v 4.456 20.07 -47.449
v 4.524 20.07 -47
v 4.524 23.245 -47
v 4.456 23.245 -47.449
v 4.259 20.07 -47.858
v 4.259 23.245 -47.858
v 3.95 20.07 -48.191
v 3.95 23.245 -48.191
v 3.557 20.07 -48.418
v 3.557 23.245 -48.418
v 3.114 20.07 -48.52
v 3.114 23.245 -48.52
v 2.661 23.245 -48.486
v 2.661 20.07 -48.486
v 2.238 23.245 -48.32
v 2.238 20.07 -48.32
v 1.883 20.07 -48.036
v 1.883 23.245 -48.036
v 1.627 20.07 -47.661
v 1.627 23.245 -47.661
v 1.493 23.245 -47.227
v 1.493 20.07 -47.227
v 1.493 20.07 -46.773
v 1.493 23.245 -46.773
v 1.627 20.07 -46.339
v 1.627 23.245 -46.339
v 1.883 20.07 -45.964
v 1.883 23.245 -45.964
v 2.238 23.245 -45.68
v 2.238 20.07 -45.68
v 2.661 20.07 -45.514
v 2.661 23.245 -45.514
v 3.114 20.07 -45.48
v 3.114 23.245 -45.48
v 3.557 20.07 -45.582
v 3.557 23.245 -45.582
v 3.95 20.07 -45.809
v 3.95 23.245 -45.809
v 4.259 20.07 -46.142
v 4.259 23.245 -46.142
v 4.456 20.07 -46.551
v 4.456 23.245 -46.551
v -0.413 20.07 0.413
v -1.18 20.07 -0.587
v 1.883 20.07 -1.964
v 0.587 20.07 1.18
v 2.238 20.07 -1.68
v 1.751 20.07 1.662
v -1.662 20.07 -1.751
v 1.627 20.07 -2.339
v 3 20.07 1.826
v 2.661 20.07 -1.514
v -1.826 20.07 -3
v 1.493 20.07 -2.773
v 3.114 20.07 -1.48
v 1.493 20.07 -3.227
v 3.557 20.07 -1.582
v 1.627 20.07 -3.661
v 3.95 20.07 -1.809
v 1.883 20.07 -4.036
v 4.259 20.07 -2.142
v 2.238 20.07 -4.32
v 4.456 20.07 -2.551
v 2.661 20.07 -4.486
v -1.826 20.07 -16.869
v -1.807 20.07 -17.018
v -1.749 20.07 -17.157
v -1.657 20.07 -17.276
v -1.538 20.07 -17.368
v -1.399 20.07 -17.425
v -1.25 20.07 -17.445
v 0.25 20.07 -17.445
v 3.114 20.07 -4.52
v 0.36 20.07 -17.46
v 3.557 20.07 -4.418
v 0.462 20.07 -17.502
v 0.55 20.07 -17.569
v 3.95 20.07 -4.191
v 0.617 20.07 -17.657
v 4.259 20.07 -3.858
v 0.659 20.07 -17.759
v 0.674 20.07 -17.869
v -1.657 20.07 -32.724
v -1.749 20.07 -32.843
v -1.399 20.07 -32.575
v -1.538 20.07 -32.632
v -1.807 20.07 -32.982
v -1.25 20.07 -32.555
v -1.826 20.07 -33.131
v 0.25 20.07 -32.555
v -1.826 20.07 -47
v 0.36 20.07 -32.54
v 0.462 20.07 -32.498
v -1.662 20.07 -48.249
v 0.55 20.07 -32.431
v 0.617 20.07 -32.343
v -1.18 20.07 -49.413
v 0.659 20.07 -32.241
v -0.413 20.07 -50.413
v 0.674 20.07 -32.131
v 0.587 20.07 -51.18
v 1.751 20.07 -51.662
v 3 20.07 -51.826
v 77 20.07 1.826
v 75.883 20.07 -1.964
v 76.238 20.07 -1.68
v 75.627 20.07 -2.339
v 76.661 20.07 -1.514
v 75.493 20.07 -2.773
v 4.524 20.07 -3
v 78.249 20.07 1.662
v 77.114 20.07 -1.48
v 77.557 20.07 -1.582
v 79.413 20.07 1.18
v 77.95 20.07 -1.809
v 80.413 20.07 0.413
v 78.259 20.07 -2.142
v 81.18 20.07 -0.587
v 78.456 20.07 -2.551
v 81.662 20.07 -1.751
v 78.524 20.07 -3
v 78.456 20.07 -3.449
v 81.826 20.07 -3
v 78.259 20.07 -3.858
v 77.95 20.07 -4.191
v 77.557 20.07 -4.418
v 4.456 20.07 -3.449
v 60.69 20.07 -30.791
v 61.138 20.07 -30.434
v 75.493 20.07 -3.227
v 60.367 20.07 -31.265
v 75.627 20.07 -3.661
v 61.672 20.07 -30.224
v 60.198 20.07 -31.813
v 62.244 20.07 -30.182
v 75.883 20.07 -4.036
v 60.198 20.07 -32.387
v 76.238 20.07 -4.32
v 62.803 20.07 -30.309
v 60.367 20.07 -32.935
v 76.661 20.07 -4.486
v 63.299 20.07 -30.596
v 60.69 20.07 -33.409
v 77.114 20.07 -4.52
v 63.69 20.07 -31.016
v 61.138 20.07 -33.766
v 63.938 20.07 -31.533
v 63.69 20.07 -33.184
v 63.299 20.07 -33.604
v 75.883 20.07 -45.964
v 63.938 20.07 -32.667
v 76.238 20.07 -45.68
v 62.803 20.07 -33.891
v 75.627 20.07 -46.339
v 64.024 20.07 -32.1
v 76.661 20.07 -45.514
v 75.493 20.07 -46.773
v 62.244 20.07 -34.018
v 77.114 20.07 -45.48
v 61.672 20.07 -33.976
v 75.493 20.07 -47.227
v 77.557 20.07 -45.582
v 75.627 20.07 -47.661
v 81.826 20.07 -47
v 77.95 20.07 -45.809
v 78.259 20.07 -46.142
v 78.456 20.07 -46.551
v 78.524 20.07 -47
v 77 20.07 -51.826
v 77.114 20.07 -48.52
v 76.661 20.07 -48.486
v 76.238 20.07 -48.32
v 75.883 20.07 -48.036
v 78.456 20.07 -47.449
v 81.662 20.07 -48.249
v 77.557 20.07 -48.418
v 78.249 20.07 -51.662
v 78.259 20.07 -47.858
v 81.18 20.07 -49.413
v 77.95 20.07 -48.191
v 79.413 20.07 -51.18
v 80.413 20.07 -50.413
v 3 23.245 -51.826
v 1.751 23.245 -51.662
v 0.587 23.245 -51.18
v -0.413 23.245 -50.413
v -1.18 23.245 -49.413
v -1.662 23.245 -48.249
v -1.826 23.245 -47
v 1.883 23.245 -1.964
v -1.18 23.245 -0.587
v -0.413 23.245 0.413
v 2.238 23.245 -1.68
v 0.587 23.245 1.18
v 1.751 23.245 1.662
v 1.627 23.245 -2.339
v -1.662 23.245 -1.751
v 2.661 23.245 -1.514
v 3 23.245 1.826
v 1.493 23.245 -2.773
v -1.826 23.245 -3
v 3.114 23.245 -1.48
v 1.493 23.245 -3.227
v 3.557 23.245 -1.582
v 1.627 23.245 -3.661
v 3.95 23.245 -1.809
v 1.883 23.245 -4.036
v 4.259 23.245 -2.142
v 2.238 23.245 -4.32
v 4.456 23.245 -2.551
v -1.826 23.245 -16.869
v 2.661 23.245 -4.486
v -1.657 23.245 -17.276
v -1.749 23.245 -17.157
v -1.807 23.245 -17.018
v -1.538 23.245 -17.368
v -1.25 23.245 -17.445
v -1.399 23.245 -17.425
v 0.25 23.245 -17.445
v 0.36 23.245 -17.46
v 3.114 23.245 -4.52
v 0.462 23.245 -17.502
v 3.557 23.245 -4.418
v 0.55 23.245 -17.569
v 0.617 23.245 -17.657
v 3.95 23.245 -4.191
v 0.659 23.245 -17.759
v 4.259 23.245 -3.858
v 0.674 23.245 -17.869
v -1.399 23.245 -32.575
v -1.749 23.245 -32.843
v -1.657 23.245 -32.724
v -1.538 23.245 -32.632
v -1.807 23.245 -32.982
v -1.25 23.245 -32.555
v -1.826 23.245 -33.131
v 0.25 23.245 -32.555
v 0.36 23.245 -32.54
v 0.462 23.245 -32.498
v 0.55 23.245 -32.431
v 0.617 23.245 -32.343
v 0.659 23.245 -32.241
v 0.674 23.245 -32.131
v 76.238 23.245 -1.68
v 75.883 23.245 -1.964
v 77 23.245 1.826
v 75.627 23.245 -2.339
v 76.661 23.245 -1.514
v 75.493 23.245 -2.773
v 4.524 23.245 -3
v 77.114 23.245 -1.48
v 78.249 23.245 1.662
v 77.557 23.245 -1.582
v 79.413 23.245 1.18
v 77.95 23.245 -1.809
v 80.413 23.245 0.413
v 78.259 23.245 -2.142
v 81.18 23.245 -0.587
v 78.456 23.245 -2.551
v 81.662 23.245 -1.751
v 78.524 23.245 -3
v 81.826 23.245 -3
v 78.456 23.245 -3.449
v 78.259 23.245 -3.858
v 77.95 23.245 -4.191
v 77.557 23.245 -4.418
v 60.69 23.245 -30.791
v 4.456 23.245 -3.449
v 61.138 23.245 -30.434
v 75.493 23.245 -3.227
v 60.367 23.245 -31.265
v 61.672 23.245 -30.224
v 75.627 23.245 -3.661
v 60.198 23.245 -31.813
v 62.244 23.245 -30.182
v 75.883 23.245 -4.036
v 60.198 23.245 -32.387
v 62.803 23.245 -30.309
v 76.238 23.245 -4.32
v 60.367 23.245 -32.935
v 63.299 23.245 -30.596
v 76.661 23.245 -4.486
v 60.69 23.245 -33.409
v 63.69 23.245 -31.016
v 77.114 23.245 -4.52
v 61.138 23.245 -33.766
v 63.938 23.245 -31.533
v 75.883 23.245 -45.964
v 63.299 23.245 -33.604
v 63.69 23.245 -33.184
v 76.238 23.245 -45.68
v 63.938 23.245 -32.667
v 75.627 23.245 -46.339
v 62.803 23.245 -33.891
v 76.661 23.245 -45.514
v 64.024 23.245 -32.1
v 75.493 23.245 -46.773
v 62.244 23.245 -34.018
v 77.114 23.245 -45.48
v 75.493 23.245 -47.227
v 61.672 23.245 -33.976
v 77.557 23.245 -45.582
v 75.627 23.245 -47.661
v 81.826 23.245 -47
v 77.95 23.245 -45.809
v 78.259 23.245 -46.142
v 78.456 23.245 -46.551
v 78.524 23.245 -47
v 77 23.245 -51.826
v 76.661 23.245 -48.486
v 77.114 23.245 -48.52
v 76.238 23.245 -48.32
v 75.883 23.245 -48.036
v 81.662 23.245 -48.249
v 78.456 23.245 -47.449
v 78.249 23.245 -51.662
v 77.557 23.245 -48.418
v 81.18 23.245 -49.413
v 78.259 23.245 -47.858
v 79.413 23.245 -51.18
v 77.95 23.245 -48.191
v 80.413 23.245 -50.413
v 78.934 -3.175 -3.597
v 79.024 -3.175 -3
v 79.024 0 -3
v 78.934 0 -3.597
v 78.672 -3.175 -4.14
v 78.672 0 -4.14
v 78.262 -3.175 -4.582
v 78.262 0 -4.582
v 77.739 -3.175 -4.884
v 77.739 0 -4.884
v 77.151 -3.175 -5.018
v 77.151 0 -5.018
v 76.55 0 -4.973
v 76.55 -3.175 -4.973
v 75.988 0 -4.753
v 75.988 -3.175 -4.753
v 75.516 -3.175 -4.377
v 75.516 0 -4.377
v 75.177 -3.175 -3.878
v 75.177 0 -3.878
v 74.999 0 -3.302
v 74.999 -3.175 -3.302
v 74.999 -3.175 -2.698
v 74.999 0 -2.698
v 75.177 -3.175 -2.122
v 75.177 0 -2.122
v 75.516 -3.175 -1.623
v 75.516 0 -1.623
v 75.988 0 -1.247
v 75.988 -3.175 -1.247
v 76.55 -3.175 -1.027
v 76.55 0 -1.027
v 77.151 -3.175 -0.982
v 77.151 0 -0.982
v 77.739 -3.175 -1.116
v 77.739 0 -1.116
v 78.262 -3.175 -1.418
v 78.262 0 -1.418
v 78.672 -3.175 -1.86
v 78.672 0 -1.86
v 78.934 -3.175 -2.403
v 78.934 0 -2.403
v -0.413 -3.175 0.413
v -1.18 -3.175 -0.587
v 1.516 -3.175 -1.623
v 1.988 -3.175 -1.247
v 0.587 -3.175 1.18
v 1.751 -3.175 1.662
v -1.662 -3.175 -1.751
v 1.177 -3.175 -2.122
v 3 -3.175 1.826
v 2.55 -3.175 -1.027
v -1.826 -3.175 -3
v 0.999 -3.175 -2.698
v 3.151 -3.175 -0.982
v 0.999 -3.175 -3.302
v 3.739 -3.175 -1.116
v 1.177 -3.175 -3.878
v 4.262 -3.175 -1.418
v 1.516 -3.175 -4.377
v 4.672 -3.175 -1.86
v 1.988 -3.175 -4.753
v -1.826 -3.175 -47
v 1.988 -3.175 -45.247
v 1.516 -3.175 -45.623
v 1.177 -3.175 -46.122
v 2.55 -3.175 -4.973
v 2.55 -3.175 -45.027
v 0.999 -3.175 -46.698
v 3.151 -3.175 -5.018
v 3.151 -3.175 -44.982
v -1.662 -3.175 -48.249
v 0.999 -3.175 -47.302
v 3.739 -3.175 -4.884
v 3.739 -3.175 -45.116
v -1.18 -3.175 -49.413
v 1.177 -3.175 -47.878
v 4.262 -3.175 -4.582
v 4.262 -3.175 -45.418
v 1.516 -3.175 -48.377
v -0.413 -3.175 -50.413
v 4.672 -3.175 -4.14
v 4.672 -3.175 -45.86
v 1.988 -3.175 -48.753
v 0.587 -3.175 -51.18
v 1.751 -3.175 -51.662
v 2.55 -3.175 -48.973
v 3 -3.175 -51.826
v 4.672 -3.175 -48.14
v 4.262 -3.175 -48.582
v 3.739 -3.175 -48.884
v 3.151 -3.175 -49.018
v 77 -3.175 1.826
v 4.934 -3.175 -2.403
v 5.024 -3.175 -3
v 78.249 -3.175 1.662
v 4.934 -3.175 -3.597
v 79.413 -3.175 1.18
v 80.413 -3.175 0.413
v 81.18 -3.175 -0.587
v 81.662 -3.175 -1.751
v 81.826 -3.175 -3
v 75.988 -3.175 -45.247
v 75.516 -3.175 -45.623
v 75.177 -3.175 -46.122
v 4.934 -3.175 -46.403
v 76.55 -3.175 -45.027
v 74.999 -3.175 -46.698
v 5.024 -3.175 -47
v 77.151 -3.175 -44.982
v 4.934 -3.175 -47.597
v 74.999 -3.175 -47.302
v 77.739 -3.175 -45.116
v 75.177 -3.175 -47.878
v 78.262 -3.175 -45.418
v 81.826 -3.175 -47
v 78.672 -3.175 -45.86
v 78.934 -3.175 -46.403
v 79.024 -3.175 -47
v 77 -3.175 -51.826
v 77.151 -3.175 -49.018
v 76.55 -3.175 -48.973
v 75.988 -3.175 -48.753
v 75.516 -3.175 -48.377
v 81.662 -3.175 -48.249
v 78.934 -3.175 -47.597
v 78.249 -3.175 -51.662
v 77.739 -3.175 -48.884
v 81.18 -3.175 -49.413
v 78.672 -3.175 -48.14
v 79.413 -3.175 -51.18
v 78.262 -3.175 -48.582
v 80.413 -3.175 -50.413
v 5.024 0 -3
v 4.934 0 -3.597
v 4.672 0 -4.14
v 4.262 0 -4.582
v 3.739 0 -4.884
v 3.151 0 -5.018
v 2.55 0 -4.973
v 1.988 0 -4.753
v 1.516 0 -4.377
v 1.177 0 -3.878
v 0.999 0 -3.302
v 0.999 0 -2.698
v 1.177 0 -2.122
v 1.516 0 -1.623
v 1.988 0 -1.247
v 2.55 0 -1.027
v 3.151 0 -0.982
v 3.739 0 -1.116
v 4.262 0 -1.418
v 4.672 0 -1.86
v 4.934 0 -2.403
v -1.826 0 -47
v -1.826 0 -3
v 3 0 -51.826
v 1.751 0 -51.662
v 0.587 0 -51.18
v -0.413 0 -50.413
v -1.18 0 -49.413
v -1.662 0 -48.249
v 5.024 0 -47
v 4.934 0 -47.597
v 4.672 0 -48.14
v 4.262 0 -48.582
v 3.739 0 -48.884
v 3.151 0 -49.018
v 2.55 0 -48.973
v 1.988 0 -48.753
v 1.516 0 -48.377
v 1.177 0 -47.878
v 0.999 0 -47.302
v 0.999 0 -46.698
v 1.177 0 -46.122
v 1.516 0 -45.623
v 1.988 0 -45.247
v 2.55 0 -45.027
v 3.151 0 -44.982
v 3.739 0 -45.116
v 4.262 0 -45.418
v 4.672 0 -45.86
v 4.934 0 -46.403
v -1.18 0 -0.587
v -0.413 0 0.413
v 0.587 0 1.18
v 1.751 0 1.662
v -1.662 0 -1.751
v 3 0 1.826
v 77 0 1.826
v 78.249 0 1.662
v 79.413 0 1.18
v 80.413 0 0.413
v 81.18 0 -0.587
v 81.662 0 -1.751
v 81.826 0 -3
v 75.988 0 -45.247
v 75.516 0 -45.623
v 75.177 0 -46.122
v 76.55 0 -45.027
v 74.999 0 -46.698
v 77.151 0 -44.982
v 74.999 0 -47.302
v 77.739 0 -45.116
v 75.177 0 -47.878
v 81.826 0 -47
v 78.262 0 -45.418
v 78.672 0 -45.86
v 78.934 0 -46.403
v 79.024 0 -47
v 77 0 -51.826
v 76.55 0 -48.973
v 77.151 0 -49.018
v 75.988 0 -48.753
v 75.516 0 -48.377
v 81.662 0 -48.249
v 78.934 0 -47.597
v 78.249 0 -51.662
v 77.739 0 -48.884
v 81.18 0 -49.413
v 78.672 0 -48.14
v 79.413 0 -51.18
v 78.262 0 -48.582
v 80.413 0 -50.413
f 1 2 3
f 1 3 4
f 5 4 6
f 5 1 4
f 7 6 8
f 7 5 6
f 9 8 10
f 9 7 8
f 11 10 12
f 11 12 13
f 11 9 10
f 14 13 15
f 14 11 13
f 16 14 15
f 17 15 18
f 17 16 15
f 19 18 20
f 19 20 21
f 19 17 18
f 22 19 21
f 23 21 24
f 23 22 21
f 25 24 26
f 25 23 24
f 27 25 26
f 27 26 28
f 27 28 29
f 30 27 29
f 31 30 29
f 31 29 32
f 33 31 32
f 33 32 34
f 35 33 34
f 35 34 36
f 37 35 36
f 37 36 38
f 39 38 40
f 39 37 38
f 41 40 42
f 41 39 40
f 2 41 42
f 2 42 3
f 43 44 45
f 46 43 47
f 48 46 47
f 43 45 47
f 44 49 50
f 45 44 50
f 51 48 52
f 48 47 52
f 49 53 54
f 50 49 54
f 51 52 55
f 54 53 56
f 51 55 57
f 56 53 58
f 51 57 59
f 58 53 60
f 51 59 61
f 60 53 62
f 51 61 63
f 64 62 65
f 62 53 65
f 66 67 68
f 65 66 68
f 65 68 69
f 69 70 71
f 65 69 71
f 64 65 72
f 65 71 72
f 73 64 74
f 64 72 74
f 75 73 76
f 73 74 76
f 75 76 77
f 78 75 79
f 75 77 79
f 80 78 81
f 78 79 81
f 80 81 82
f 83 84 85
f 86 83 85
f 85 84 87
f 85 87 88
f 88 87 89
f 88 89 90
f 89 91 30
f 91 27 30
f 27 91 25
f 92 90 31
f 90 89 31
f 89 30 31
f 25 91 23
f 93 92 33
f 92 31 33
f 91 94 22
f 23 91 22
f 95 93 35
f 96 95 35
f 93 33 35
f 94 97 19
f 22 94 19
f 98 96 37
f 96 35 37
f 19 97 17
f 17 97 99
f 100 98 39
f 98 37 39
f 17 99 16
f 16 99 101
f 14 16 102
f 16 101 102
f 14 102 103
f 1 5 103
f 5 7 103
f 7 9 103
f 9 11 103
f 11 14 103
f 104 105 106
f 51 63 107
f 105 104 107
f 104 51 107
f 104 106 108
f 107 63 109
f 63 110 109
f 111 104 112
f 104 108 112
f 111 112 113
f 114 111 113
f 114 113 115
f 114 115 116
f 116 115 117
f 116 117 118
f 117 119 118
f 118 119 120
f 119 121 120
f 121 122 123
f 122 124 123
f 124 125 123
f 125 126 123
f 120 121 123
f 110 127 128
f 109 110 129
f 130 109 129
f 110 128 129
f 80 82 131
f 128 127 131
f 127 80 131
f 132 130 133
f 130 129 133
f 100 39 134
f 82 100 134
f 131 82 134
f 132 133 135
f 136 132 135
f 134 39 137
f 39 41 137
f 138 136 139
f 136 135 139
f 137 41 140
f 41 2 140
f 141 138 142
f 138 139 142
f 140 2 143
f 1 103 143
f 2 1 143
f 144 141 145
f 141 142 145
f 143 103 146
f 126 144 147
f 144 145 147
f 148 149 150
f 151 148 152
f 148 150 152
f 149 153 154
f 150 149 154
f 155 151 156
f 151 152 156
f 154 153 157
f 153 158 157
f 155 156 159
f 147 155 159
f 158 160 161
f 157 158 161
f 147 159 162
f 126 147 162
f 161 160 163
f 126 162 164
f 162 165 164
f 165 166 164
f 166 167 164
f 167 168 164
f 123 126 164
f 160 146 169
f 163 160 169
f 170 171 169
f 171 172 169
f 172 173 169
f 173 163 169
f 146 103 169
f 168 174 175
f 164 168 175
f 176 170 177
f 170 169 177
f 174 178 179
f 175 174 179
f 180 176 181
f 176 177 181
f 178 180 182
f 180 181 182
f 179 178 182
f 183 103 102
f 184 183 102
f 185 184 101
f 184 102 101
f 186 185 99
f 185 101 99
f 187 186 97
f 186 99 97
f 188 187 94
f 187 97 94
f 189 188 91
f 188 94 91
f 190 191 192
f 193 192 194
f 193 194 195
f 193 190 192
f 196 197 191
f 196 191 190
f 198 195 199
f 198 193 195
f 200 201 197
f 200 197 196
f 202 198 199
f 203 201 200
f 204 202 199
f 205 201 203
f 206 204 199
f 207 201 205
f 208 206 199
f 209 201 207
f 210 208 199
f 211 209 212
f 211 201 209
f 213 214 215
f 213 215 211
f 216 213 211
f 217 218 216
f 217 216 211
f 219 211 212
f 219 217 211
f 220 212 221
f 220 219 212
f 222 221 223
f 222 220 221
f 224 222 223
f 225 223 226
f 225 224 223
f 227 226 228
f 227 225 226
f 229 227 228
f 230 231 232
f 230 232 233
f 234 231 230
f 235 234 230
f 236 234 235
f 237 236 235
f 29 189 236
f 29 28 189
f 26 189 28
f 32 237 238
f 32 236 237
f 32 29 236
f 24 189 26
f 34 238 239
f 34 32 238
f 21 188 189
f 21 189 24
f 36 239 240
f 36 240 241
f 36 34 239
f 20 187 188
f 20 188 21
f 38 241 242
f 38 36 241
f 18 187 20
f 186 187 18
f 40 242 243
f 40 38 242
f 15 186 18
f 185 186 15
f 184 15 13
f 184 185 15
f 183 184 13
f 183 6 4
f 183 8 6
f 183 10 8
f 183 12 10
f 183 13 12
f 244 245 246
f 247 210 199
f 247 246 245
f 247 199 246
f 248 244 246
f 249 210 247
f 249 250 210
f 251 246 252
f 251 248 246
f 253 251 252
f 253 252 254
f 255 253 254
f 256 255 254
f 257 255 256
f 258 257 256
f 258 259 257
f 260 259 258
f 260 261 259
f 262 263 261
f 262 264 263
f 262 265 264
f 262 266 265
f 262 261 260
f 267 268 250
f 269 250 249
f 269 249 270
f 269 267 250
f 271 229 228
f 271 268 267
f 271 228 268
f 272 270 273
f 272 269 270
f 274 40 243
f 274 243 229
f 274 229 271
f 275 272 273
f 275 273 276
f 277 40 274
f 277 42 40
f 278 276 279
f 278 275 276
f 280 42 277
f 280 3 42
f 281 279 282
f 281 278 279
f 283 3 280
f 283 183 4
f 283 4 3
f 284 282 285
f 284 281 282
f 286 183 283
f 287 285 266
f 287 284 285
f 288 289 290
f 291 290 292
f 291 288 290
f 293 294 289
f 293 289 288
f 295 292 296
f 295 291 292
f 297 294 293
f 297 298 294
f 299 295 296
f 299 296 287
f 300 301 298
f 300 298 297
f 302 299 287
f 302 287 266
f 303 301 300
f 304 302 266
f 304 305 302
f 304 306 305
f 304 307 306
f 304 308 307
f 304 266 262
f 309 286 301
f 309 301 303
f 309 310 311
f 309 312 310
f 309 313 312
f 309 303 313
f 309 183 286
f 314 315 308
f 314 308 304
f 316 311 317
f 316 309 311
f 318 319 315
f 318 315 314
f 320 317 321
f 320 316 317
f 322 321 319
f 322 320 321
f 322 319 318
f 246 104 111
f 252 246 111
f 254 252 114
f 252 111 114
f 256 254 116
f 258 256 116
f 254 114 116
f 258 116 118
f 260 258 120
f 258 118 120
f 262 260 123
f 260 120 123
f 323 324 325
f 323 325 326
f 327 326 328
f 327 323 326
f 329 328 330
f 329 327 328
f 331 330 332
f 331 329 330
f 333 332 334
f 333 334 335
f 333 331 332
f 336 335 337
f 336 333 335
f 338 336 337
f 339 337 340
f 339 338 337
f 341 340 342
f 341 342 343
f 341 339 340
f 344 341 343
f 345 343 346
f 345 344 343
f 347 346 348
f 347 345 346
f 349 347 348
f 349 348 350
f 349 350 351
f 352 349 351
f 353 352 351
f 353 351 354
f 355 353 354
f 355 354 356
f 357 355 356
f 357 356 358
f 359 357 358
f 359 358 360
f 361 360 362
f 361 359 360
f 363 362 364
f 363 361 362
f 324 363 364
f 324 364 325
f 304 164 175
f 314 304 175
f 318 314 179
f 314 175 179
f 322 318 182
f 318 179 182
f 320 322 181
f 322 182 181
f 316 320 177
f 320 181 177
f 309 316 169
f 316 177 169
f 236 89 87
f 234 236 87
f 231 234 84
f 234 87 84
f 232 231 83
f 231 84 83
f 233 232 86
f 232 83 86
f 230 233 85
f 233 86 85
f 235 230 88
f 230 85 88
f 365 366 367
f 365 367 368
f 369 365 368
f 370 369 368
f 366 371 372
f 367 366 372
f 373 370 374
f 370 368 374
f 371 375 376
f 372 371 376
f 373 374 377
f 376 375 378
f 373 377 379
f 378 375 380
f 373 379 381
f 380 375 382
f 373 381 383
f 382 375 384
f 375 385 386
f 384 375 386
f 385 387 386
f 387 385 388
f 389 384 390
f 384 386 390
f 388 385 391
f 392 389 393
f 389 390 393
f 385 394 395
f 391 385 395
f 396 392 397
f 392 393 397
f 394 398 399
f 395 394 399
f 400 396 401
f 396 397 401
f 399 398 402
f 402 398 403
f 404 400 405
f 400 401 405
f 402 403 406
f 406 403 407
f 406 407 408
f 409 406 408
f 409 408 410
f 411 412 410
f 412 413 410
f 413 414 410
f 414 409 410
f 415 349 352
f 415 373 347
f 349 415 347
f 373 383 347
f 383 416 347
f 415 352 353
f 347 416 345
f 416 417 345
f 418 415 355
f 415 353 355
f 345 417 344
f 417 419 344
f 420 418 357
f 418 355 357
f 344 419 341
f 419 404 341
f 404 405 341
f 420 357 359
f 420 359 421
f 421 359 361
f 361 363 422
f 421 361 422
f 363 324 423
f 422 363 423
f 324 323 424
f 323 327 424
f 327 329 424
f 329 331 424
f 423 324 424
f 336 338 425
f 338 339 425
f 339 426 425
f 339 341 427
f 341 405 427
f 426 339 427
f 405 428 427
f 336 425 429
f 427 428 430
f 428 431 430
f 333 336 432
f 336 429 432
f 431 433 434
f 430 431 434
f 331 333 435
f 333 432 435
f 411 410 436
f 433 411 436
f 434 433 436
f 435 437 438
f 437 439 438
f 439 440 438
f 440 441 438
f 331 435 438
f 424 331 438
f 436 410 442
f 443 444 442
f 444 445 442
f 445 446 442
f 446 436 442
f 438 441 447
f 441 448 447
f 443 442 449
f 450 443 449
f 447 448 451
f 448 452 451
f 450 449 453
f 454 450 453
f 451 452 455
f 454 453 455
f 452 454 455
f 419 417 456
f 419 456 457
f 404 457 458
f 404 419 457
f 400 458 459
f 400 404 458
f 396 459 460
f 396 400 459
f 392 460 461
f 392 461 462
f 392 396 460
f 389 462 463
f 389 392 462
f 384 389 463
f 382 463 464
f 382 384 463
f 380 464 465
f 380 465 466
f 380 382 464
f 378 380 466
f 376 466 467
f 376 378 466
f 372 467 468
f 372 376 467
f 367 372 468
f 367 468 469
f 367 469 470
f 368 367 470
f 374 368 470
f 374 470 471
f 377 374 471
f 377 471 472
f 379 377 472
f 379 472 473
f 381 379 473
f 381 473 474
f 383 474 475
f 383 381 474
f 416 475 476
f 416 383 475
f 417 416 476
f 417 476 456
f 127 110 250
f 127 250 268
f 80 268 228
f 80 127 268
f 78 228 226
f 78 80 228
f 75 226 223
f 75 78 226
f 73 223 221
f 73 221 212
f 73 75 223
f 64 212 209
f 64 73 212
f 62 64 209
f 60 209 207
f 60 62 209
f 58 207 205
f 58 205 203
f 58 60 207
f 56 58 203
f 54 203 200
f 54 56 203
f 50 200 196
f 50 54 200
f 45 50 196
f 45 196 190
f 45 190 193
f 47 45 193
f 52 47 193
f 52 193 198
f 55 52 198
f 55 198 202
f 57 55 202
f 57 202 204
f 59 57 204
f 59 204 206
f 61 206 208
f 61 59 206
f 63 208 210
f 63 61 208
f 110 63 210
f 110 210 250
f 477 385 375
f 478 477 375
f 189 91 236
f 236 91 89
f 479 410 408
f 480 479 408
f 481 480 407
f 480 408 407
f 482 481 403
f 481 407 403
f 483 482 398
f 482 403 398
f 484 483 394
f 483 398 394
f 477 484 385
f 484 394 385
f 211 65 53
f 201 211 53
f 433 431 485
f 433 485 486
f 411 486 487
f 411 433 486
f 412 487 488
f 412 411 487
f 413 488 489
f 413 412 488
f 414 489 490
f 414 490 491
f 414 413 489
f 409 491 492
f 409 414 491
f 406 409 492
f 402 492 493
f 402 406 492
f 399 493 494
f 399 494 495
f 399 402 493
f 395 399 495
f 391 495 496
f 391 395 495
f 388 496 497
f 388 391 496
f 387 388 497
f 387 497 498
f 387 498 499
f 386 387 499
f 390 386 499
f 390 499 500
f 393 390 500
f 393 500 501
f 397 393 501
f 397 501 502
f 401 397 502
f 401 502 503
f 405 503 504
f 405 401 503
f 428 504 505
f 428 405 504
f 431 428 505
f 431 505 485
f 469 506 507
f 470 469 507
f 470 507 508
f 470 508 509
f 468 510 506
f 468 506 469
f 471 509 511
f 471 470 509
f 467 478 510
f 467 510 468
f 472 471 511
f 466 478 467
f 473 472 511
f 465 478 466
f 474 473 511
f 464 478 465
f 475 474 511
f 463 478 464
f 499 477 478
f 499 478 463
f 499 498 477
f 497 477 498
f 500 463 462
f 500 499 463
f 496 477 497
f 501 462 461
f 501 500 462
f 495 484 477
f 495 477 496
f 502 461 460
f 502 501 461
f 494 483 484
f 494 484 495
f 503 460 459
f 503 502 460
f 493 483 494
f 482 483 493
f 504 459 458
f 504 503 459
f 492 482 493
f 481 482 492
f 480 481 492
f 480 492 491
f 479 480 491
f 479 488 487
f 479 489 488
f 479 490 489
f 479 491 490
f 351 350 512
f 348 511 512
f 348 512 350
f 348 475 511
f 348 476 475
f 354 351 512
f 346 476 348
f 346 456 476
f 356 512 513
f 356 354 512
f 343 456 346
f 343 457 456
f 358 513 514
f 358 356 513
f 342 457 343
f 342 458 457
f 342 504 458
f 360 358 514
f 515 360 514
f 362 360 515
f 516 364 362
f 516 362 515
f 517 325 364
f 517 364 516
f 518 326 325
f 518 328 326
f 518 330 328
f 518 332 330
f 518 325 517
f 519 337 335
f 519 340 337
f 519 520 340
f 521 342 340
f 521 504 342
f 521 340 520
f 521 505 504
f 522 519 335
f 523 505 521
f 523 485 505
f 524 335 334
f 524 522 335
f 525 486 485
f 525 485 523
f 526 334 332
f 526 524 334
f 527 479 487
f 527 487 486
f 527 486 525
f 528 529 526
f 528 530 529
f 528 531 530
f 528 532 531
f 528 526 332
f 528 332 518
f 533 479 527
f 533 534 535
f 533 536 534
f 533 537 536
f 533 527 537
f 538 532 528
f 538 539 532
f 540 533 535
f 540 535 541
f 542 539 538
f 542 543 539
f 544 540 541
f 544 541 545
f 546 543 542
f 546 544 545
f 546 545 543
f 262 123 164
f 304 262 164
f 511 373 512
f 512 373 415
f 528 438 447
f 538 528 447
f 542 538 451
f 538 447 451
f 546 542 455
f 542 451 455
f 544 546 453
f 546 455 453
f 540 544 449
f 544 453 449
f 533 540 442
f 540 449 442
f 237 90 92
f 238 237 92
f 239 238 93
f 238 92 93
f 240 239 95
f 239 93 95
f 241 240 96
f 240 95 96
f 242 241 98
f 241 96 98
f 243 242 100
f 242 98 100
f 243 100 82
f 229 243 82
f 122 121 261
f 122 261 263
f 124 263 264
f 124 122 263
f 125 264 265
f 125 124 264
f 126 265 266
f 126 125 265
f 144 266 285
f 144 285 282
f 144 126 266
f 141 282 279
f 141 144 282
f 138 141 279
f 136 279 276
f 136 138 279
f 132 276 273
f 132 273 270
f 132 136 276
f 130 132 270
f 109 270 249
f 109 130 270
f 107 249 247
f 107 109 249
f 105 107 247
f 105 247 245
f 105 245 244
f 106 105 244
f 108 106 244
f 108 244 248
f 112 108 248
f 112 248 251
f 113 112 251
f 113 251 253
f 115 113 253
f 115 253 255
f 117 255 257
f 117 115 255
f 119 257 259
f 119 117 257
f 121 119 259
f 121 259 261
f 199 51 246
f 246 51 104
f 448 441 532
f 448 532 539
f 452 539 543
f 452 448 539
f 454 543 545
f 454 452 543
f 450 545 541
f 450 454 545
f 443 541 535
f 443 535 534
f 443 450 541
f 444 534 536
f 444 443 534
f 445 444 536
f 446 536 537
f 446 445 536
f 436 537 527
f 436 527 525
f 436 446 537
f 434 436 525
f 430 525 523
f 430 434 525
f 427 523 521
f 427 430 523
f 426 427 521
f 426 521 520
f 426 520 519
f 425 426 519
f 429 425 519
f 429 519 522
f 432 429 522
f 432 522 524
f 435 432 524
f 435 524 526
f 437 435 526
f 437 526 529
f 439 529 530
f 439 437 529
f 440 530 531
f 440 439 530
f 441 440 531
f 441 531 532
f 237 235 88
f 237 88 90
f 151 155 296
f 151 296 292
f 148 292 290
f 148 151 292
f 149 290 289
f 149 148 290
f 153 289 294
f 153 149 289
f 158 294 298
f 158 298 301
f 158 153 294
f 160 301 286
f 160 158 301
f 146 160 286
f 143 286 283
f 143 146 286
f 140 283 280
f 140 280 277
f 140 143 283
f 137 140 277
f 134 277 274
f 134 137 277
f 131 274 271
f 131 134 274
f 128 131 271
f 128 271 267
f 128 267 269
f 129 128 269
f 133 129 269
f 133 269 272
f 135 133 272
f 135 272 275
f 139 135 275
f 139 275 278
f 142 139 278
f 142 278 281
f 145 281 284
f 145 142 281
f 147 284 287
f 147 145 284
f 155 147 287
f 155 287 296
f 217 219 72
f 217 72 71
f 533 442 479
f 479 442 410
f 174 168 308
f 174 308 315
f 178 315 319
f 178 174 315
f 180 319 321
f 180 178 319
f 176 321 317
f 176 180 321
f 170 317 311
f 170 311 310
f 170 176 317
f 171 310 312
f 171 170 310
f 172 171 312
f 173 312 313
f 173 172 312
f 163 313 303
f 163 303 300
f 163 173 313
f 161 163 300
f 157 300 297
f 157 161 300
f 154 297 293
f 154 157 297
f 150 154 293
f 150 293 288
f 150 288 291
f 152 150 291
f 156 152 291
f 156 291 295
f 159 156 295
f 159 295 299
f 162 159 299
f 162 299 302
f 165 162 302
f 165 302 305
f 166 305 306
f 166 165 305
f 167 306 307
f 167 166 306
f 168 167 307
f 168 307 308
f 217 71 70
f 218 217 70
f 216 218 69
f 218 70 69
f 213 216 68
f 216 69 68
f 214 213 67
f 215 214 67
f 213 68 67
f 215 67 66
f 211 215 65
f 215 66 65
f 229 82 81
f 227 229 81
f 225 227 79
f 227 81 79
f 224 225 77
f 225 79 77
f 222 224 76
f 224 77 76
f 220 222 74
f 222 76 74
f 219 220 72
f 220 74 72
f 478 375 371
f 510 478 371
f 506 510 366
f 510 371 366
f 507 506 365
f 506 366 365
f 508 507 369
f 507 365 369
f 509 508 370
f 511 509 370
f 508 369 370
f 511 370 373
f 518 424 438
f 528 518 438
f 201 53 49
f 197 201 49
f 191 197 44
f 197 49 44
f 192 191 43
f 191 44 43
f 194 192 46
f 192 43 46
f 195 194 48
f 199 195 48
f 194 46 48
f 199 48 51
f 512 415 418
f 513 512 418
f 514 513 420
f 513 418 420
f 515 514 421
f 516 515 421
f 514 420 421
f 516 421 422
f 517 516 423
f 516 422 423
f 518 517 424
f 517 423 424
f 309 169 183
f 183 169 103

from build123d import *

# Parameters (mm, degrees)
BOSS_EXTRUDE1_DEPTH             = 20.07
SKETCH3_R                       = 1.6
BOSS_EXTRUDE2_DEPTH             = 5.5
FILLET1_R                       = 2.5
CUT_EXTRUDE1_REACH              = 102.265
SKETCH4_R                       = 3.25
CUT_EXTRUDE2_REACH              = 102.265
SKETCH5_R                       = 2.15
CUT_EXTRUDE5_REACH              = 101.74
MOVE_START                      = 79.994994432
MOVE_FACE1_OUTLINE_R            = 3.75
MOVE_FACE1_OUTLINE_R_2          = 3.25
MOVE_FACE1_DEPTH                = 3.005005568
MOVE_START_2                    = -3
MOVE_FACE1_2_OUTLINE_R          = 2.65
MOVE_FACE1_2_OUTLINE_R_2        = 2.15
MOVE_FACE1_2_DEPTH              = 82.994994432
MOVE_FACE2_BY                   = 0.1
MOVE_FACE2_2_BY                 = 0.1
MOVE_FACE2_3_BY                 = 0.1
MOVE_FACE2_4_BY                 = 0.1
MOVE_FACE2_5_BY                 = 0.1
MOVE_FACE2_6_BY                 = 0.1
MOVE_FACE2_7_BY                 = 0.1
MOVE_FACE2_8_BY                 = 0.1
MOVE_FACE2_9_BY                 = 0.1
MOVE_FACE2_10_BY                = 0.1
MOVE_FACE2_11_BY                = 0.1
MOVE_FACE3_BY                   = 0.1
MOVE_FACE3_2_BY                 = 0.1
MOVE_FACE3_3_BY                 = 0.1
MOVE_FACE3_4_BY                 = 0.1
SKETCH6_R                       = 1.6
BOSS_EXTRUDE3_DEPTH             = 3.175
SKETCH7_R                       = 2
CUT_EXTRUDE3_DEPTH              = 3.175
SKETCH8_W                       = 2.5
SKETCH8_H                       = 15.2622
CUT_EXTRUDE4_DEPTH              = 3.175
SKETCH10_R                      = 2.1
M3_HEAT_SET_INSERT_HOLES_DEPTH  = 3.175
FILLET2_R                       = 0.5
KERF_START                      = -3.175
KERF_COMPENSATION_OUTLINE_R     = 2.1
KERF_COMPENSATION_OUTLINE_R_2   = 2.0238
KERF_COMPENSATION_DEPTH         = 3.175
KERF_START_2                    = 20.07
KERF_COMPENSATION_2_OUTLINE_R   = 1.6
KERF_COMPENSATION_2_OUTLINE_R_2 = 1.5238
KERF_COMPENSATION_2_OUTLINE_R_3 = 2
KERF_COMPENSATION_2_OUTLINE_R_4 = 1.9238
KERF_COMPENSATION_2_DEPTH       = 3.175


with BuildPart() as part:
    # Sketch2 → Boss-Extrude1 (new body)
    with BuildSketch(Plane(origin=(0, 0, 0), x_dir=(1, 0, 0), z_dir=(0, 1, 0))):
        with BuildLine():
            Line((77, 51.75), (3, 51.75))
            ThreePointArc((3, 51.75), (-0.358757211, 50.358757211), (-1.75, 47))
            Line((-1.75, 47), (-1.75, 3))
            ThreePointArc((-1.75, 3), (-0.358757211, -0.358757211), (3, -1.75))
            Line((3, -1.75), (77, -1.75))
            ThreePointArc((77, -1.75), (80.358757211, -0.358757211), (81.75, 3))
            Line((81.75, 3), (81.75, 47))
            ThreePointArc((81.75, 47), (80.358757211, 50.358757211), (77, 51.75))
        make_face()
        with BuildLine():
            Line((-0.25, 47), (-0.25, 3))
            ThreePointArc((-0.25, 3), (0.701902961, 0.701902961), (3, -0.25))
            Line((3, -0.25), (77, -0.25))
            ThreePointArc((77, -0.25), (79.298097039, 0.701902961), (80.25, 3))
            Line((80.25, 3), (80.25, 47))
            ThreePointArc((80.25, 47), (79.298097039, 49.298097039), (77, 50.25))
            Line((77, 50.25), (3, 50.25))
            ThreePointArc((3, 50.25), (0.701902961, 49.298097039), (-0.25, 47))
        make_face(mode=Mode.SUBTRACT)
    extrude(amount=BOSS_EXTRUDE1_DEPTH)

    # Sketch3 → Boss-Extrude2 (add)
    # profile 1 of 4: a face of its own
    with BuildSketch(Plane.XZ):
        with BuildLine():
            ThreePointArc((-0.25, -47), (0.701902961, -49.298097039), (3, -50.25))
            Line((3, -50.25), (5.5, -50.25))
            Line((5.5, -50.25), (5.5, -44.5))
            Line((5.5, -44.5), (-0.25, -44.5))
            Line((-0.25, -44.5), (-0.25, -47))
        make_face()
        with Locations(Location((3, -47, 0), (0, 0, 270))):
            Circle(SKETCH3_R, mode=Mode.SUBTRACT)
    # profile 2 of 4: a face of its own
    with BuildSketch(Plane.XZ):
        with BuildLine():
            Line((74.5, -44.5), (74.5, -50.25))
            Line((74.5, -50.25), (77, -50.25))
            ThreePointArc((77, -50.25), (79.298097039, -49.298097039), (80.25, -47))
            Line((80.25, -47), (80.25, -44.5))
            Line((80.25, -44.5), (74.5, -44.5))
        make_face()
        with Locations(Location((77, -47, 0), (0, 0, 270))):
            Circle(SKETCH3_R, mode=Mode.SUBTRACT)
    # profile 3 of 4: a face of its own
    with BuildSketch(Plane.XZ):
        with BuildLine():
            Line((74.5, -5.5), (80.25, -5.5))
            Line((80.25, -5.5), (80.25, -3))
            ThreePointArc((80.25, -3), (79.298097039, -0.701902961), (77, 0.25))
            Line((77, 0.25), (74.5, 0.25))
            Line((74.5, 0.25), (74.5, -5.5))
        make_face()
        with Locations(Location((77, -3, 0), (0, 0, 270))):
            Circle(SKETCH3_R, mode=Mode.SUBTRACT)
    # profile 4 of 4: a face of its own
    with BuildSketch(Plane.XZ):
        with BuildLine():
            Line((-0.25, -3), (-0.25, -5.5))
            Line((-0.25, -5.5), (5.5, -5.5))
            Line((5.5, -5.5), (5.5, 0.25))
            Line((5.5, 0.25), (3, 0.25))
            ThreePointArc((3, 0.25), (0.701902961, -0.701902961), (-0.25, -3))
        make_face()
        with Locations(Location((3, -3, 0), (0, 0, 270))):
            Circle(SKETCH3_R, mode=Mode.SUBTRACT)
    extrude(amount=-BOSS_EXTRUDE2_DEPTH)

    # Fillet1
    fillet1_edges = [part.edges().sort_by_distance(p)[0] for p in [
        (5.5, 2.75, 0.25),
        (5.5, 2.75, -5.5),
        (-0.25, 2.75, -5.5),
        (5.5, 2.75, -44.5),
        (5.5, 2.75, -50.25),
        (-0.25, 2.75, -44.5),
        (74.5, 2.75, -50.25),
        (74.5, 2.75, -44.5),
        (80.25, 2.75, -44.5),
        (74.5, 2.75, -5.5),
        (74.5, 2.75, 0.25),
        (80.25, 2.75, -5.5),
    ]]
    fillet(fillet1_edges, radius=FILLET1_R)

    # Sketch4 → Cut-Extrude1 (cut, up to next)
    with BuildSketch(Plane(origin=(81.75, 0, 0), x_dir=(0, 0, -1), z_dir=(1, 0, 0)), mode=Mode.PRIVATE) as cut_extrude1_sk1:
        with Locations((11.25, 13.5662)):
            Circle(SKETCH4_R)
    cut_extrude1_tool1 = extrude(cut_extrude1_sk1.sketch, amount=-CUT_EXTRUDE1_REACH, mode=Mode.PRIVATE) & part.part
    # Sketch4 → Cut-Extrude1 (cut, up to next)
    with BuildSketch(Plane(origin=(81.75, 0, 0), x_dir=(0, 0, -1), z_dir=(1, 0, 0)), mode=Mode.PRIVATE) as cut_extrude1_sk2:
        with BuildLine():
            Line((21.83, 7.07), (28.17, 7.07))
            ThreePointArc((28.17, 7.07), (29.089238816, 7.450761184), (29.47, 8.37))
            Line((29.47, 8.37), (29.47, 9.13))
            ThreePointArc((29.47, 9.13), (29.089238816, 10.049238816), (28.17, 10.43))
            Line((28.17, 10.43), (21.83, 10.43))
            ThreePointArc((21.83, 10.43), (20.910761184, 10.049238816), (20.53, 9.13))
            Line((20.53, 9.13), (20.53, 8.37))
            ThreePointArc((20.53, 8.37), (20.910761184, 7.450761184), (21.83, 7.07))
        make_face()
    cut_extrude1_tool2 = extrude(cut_extrude1_sk2.sketch, amount=-CUT_EXTRUDE1_REACH, mode=Mode.PRIVATE) & part.part
    # Sketch4 → Cut-Extrude1 (cut, up to next)
    with BuildSketch(Plane(origin=(81.75, 0, 0), x_dir=(0, 0, -1), z_dir=(1, 0, 0)), mode=Mode.PRIVATE) as cut_extrude1_sk3:
        with BuildLine():
            Line((36.5, 14.4662), (36.5, 20.07))
            ThreePointArc((36.5, 20.07), (39.6, 23.17), (42.7, 20.07))
            Line((42.7, 20.07), (42.7, 14.4662))
            ThreePointArc((42.7, 14.4662), (39.6, 11.3662), (36.5, 14.4662))
        make_face()
    cut_extrude1_tool3 = extrude(cut_extrude1_sk3.sketch, amount=-CUT_EXTRUDE1_REACH, mode=Mode.PRIVATE) & part.part
    # Sketch4 → Cut-Extrude1 (cut, up to next)
    with BuildSketch(Plane(origin=(81.75, 0, 0), x_dir=(0, 0, -1), z_dir=(1, 0, 0)), mode=Mode.PRIVATE) as cut_extrude1_sk4:
        Polygon((36.6, 2.78), (36.6, 5.28), (42.6, 5.28), (42.6, 2.704447838), (42.6, 0), (36.6, 0), align=None)
    cut_extrude1_tool4 = extrude(cut_extrude1_sk4.sketch, amount=-CUT_EXTRUDE1_REACH, mode=Mode.PRIVATE) & part.part
    add(cut_extrude1_tool1.solids().sort_by_distance((81.75, 13.5662, -11.25))[0], mode=Mode.SUBTRACT)
    add(cut_extrude1_tool2.solids().sort_by_distance((81.75, 8.75, -25))[0], mode=Mode.SUBTRACT)
    add(cut_extrude1_tool3.solids().sort_by_distance((81.75, 17.2681, -39.6))[0], mode=Mode.SUBTRACT)
    add(cut_extrude1_tool4.solids().sort_by_distance((81.75, 2.64, -39.6))[0], mode=Mode.SUBTRACT)

    # Sketch5 → Cut-Extrude2 (cut, up to next)
    with BuildSketch(Plane.ZY.offset(1.75), mode=Mode.PRIVATE) as cut_extrude2_sk1:
        with Locations((-11.97865482, 11.37450981)):
            Circle(SKETCH5_R)
    cut_extrude2_tool1 = extrude(cut_extrude2_sk1.sketch, amount=-CUT_EXTRUDE2_REACH, mode=Mode.PRIVATE) & part.part
    # Sketch5 → Cut-Extrude2 (cut, up to next)
    with BuildSketch(Plane.ZY.offset(1.75), mode=Mode.PRIVATE) as cut_extrude2_sk2:
        with BuildLine():
            Line((-32.5311, 15.7022), (-32.5311, 20.07))
            ThreePointArc((-32.5311, 20.07), (-25, 27.6011), (-17.4689, 20.07))
            Line((-17.4689, 20.07), (-17.4689, 15.7022))
            ThreePointArc((-17.4689, 15.7022), (-25, 8.1711), (-32.5311, 15.7022))
        make_face()
    cut_extrude2_tool2 = extrude(cut_extrude2_sk2.sketch, amount=-CUT_EXTRUDE2_REACH, mode=Mode.PRIVATE) & part.part
    add(cut_extrude2_tool1.solids().sort_by_distance((-1.75, 11.37451, -11.978655))[0], mode=Mode.SUBTRACT)
    add(cut_extrude2_tool2.solids().sort_by_distance((-1.75, 17.8861, -25))[0], mode=Mode.SUBTRACT)

    # Sketch9 → Cut-Extrude5 (cut, up to next)
    with BuildSketch(Plane.XY.offset(1.75), mode=Mode.PRIVATE) as cut_extrude5_sk1:
        with BuildLine():
            Line((33.55, 7.07), (33.55, 11.07))
            ThreePointArc((33.55, 11.07), (34.3, 11.82), (35.05, 11.07))
            Line((35.05, 11.07), (35.05, 7.07))
            ThreePointArc((35.05, 7.07), (34.3, 6.32), (33.55, 7.07))
        make_face()
    cut_extrude5_tool1 = extrude(cut_extrude5_sk1.sketch, amount=-CUT_EXTRUDE5_REACH, mode=Mode.PRIVATE) & part.part
    add(cut_extrude5_tool1.solids().sort_by_distance((34.3, 9.07, 1.75))[0], mode=Mode.SUBTRACT)

    # Move Face1: read off the stored shape, not the designer's step
    # Move Face1 outline → Move Face1 (cut)
    # profile 1 of 3: a face of its own
    with BuildSketch(Plane.YZ.offset(MOVE_START)):
        Polygon((0, -42.6), (0, -43.1), (5.5, -43.1), (5.78, -43.1), (5.78, -36.1), (0, -36.1), (0, -36.6), (5.28, -36.6), (5.28, -42.6), align=None)
    # profile 2 of 3: a face of its own
    with BuildSketch(Plane.YZ.offset(MOVE_START)):
        with Locations((13.5662, -11.25)):
            Circle(MOVE_FACE1_OUTLINE_R)
        with Locations((13.5662, -11.25)):
            Circle(MOVE_FACE1_OUTLINE_R_2, mode=Mode.SUBTRACT)
    # profile 3 of 3: a face of its own
    with BuildSketch(Plane.YZ.offset(MOVE_START)):
        with BuildLine():
            ThreePointArc((14.4662, -36), (10.8662, -39.6), (14.4662, -43.2))
            Line((14.4662, -43.2), (20.07, -43.2))
            Line((20.07, -43.2), (20.07, -42.7))
            Line((20.07, -42.7), (14.4662, -42.7))
            ThreePointArc((14.4662, -42.7), (11.3662, -39.6), (14.4662, -36.5))
            Line((14.4662, -36.5), (20.07, -36.5))
            Line((20.07, -36.5), (20.07, -36))
            Line((20.07, -36), (14.4662, -36))
        make_face()
    extrude(amount=MOVE_FACE1_DEPTH, mode=Mode.SUBTRACT)

    # Move Face1 2 outline → Move Face1 2 (cut)
    with BuildSketch(Plane.YZ.offset(MOVE_START_2)):
        with Locations((11.37450981, -11.97865482)):
            Circle(MOVE_FACE1_2_OUTLINE_R)
        with Locations((11.37450981, -11.97865482)):
            Circle(MOVE_FACE1_2_OUTLINE_R_2, mode=Mode.SUBTRACT)
    extrude(amount=MOVE_FACE1_2_DEPTH, mode=Mode.SUBTRACT)

    # Move Face2: a curved face moved inward by 0.1
    add(Solid.thicken(part.faces().sort_by_distance((81, 7.450761184, -29.089238816))[0], -MOVE_FACE2_BY), mode=Mode.SUBTRACT)

    # Move Face2 2: a face moved inward by 0.1
    extrude(part.faces().sort_by_distance((81, 10.43, -25))[0], amount=MOVE_FACE2_2_BY, dir=(0, 1, 0), mode=Mode.SUBTRACT)

    # Move Face2 3: a face moved inward by 0.1
    extrude(part.faces().sort_by_distance((81, 8.75, -29.47))[0], amount=MOVE_FACE2_3_BY, dir=(0, 0, -1), mode=Mode.SUBTRACT)

    # Move Face2 4: a curved face moved inward by 0.1
    add(Solid.thicken(part.faces().sort_by_distance((81, 10.049238816, -29.089238816))[0], -MOVE_FACE2_4_BY), mode=Mode.SUBTRACT)

    # Move Face2 5: a curved face moved inward by 0.1
    add(Solid.thicken(part.faces().sort_by_distance((81, 10.049238816, -20.910761184))[0], -MOVE_FACE2_5_BY), mode=Mode.SUBTRACT)

    # Move Face2 6: a face moved inward by 0.1
    extrude(part.faces().sort_by_distance((81, 8.75, -20.53))[0], amount=MOVE_FACE2_6_BY, dir=(0, 0, 1), mode=Mode.SUBTRACT)

    # Move Face2 7: a face moved inward by 0.1
    extrude(part.faces().sort_by_distance((81, 7.07, -25))[0], amount=MOVE_FACE2_7_BY, dir=(0, -1, 0), mode=Mode.SUBTRACT)

    # Move Face2 8: a curved face moved inward by 0.1
    add(Solid.thicken(part.faces().sort_by_distance((81, 7.450761184, -20.910761184))[0], -MOVE_FACE2_8_BY), mode=Mode.SUBTRACT)

    # Move Face2 9: a curved face moved inward by 0.1
    add(Solid.thicken(part.faces().sort_by_distance((-1, 8.1711, -25))[0], -MOVE_FACE2_9_BY), mode=Mode.SUBTRACT)

    # Move Face2 10: a face moved inward by 0.1
    extrude(part.faces().sort_by_distance((-1, 17.8861, -32.5311))[0], amount=MOVE_FACE2_10_BY, dir=(0, 0, -1), mode=Mode.SUBTRACT)

    # Move Face2 11: a face moved inward by 0.1
    extrude(part.faces().sort_by_distance((-1, 17.8861, -17.4689))[0], amount=MOVE_FACE2_11_BY, dir=(0, 0, 1), mode=Mode.SUBTRACT)

    # Move Face3: a curved face moved inward by 0.1
    add(Solid.thicken(part.faces().sort_by_distance((3, 2.75, -45.4))[0], -MOVE_FACE3_BY), mode=Mode.SUBTRACT)

    # Move Face3 2: a curved face moved inward by 0.1
    add(Solid.thicken(part.faces().sort_by_distance((77, 2.75, -45.4))[0], -MOVE_FACE3_2_BY), mode=Mode.SUBTRACT)

    # Move Face3 3: a curved face moved inward by 0.1
    add(Solid.thicken(part.faces().sort_by_distance((77, 2.75, -1.4))[0], -MOVE_FACE3_3_BY), mode=Mode.SUBTRACT)

    # Move Face3 4: a curved face moved inward by 0.1
    add(Solid.thicken(part.faces().sort_by_distance((3, 2.75, -1.4))[0], -MOVE_FACE3_4_BY), mode=Mode.SUBTRACT)


with BuildPart() as body_2:
    # Sketch6 → Boss-Extrude3 (new body)
    with BuildSketch(Plane(origin=(0, 20.07, 0), x_dir=(1, 0, 0), z_dir=(0, 1, 0))):
        with BuildLine():
            Line((3, -1.75), (77, -1.75))
            ThreePointArc((77, -1.75), (80.358757211, -0.358757211), (81.75, 3))
            Line((81.75, 3), (81.75, 47))
            ThreePointArc((81.75, 47), (80.358757211, 50.358757211), (77, 51.75))
            Line((77, 51.75), (3, 51.75))
            ThreePointArc((3, 51.75), (-0.358757211, 50.358757211), (-1.75, 47))
            Line((-1.75, 47), (-1.75, 3))
            ThreePointArc((-1.75, 3), (-0.358757211, -0.358757211), (3, -1.75))
        make_face()
        with Locations(Location((77, 47, 0), (0, 0, 270))):
            Circle(SKETCH6_R, mode=Mode.SUBTRACT)
        with Locations(Location((3, 47, 0), (0, 0, 270))):
            Circle(SKETCH6_R, mode=Mode.SUBTRACT)
        with Locations(Location((77, 3, 0), (0, 0, 270))):
            Circle(SKETCH6_R, mode=Mode.SUBTRACT)
        with Locations(Location((3, 3, 0), (0, 0, 270))):
            Circle(SKETCH6_R, mode=Mode.SUBTRACT)
    extrude(amount=BOSS_EXTRUDE3_DEPTH)


with BuildPart() as body_3:
    # Body-Move/Copy3: copy of body 2
    add(body_2.part.moved(Location((0, -44.867382743, 0))))


with BuildPart() as body_3_1:
    # Body-Move/Copy4: read off the stored shape, not the designer's step
    # Body-Move/Copy4: moved
    add(body_3.part.moved(Location((0, 21.6223827, 0))))

    # Sketch10 → M3 Heat Set Insert Holes (cut)
    with BuildSketch(Plane.XZ.offset(3.175)):
        with Locations(Location((77, -3, 0), (0, 0, 270))):
            Circle(SKETCH10_R)
        with Locations(Location((3, -3, 0), (0, 0, 270))):
            Circle(SKETCH10_R)
        with Locations(Location((77, -47, 0), (0, 0, 270))):
            Circle(SKETCH10_R)
        with Locations(Location((3, -47, 0), (0, 0, 270))):
            Circle(SKETCH10_R)
    extrude(amount=-M3_HEAT_SET_INSERT_HOLES_DEPTH, mode=Mode.SUBTRACT)

    # kerf compensation: read off the stored shape, not the designer's step
    # kerf compensation outline → kerf compensation (add)
    # profile 1 of 5: a face of its own
    with BuildSketch(Plane(origin=(0, 0, 0), x_dir=(1, 0, 0), z_dir=(0, 1, 0)).offset(KERF_START)):
        with BuildLine():
            ThreePointArc((77, -1.8262), (80.412638747, -0.412638747), (81.8262, 3))
            Line((81.8262, 3), (81.8262, 47))
            ThreePointArc((81.8262, 47), (80.412638747, 50.412638747), (77, 51.8262))
            Line((77, 51.8262), (3, 51.8262))
            ThreePointArc((3, 51.8262), (-0.412638747, 50.412638747), (-1.8262, 47))
            Line((-1.8262, 47), (-1.8262, 3))
            ThreePointArc((-1.8262, 3), (-0.412638747, -0.412638747), (3, -1.8262))
            Line((3, -1.8262), (77, -1.8262))
        make_face()
        with BuildLine():
            Line((81.75, 47), (81.75, 3))
            ThreePointArc((81.75, 3), (80.358757211, -0.358757211), (77, -1.75))
            Line((77, -1.75), (3, -1.75))
            ThreePointArc((3, -1.75), (-0.358757211, -0.358757211), (-1.75, 3))
            Line((-1.75, 3), (-1.75, 47))
            ThreePointArc((-1.75, 47), (-0.358757211, 50.358757211), (3, 51.75))
            Line((3, 51.75), (77, 51.75))
            ThreePointArc((77, 51.75), (80.358757211, 50.358757211), (81.75, 47))
        make_face(mode=Mode.SUBTRACT)
    # profile 2 of 5: a face of its own
    with BuildSketch(Plane(origin=(0, 0, 0), x_dir=(1, 0, 0), z_dir=(0, 1, 0)).offset(KERF_START)):
        with Locations((77, 3)):
            Circle(KERF_COMPENSATION_OUTLINE_R)
        with Locations((77, 3)):
            Circle(KERF_COMPENSATION_OUTLINE_R_2, mode=Mode.SUBTRACT)
    # profile 3 of 5: a face of its own
    with BuildSketch(Plane(origin=(0, 0, 0), x_dir=(1, 0, 0), z_dir=(0, 1, 0)).offset(KERF_START)):
        with Locations((3, 47)):
            Circle(KERF_COMPENSATION_OUTLINE_R)
        with Locations((3, 47)):
            Circle(KERF_COMPENSATION_OUTLINE_R_2, mode=Mode.SUBTRACT)
    # profile 4 of 5: a face of its own
    with BuildSketch(Plane(origin=(0, 0, 0), x_dir=(1, 0, 0), z_dir=(0, 1, 0)).offset(KERF_START)):
        with Locations((77, 47)):
            Circle(KERF_COMPENSATION_OUTLINE_R)
        with Locations((77, 47)):
            Circle(KERF_COMPENSATION_OUTLINE_R_2, mode=Mode.SUBTRACT)
    # profile 5 of 5: a face of its own
    with BuildSketch(Plane(origin=(0, 0, 0), x_dir=(1, 0, 0), z_dir=(0, 1, 0)).offset(KERF_START)):
        with Locations((3, 3)):
            Circle(KERF_COMPENSATION_OUTLINE_R)
        with Locations((3, 3)):
            Circle(KERF_COMPENSATION_OUTLINE_R_2, mode=Mode.SUBTRACT)
    extrude(amount=KERF_COMPENSATION_DEPTH)


with BuildPart() as body_2_1:
    add(body_2.part)

    # Sketch7 → Cut-Extrude3 (cut)
    with BuildSketch(Plane(origin=(0, 23.245, 0), x_dir=(1, 0, 0), z_dir=(0, 1, 0))):
        with Locations(Location((62.1, 32.1, 0), (0, 0, 270))):
            Circle(SKETCH7_R)
    extrude(amount=-CUT_EXTRUDE3_DEPTH, mode=Mode.SUBTRACT)

    # Sketch8 → Cut-Extrude4 (cut)
    with BuildSketch(Plane(origin=(0, 23.245, 0), x_dir=(1, 0, 0), z_dir=(0, 1, 0))):
        with Locations((-0.5, 25)):
            Rectangle(SKETCH8_W, SKETCH8_H)
    extrude(amount=-CUT_EXTRUDE4_DEPTH, mode=Mode.SUBTRACT)

    # Fillet2
    fillet2_edges = [body_2_1.edges().sort_by_distance(p)[0] for p in [
        (-1.75, 21.6575, -17.3689),
        (-1.75, 21.6575, -32.6311),
        (0.75, 21.6575, -32.6311),
        (0.75, 21.6575, -17.3689),
    ]]
    fillet(fillet2_edges, radius=FILLET2_R)

    # kerf compensation 2 outline → kerf compensation 2 (add)
    # profile 1 of 6: a face of its own
    with BuildSketch(Plane(origin=(0, 0, 0), x_dir=(1, 0, 0), z_dir=(0, 1, 0)).offset(KERF_START_2)):
        with BuildLine():
            Line((-1.8262, 47), (-1.8262, 33.1311))
            ThreePointArc((-1.8262, 33.1311), (-1.657434927, 32.723665073), (-1.25, 32.5549))
            Line((-1.25, 32.5549), (0.25, 32.5549))
            ThreePointArc((0.25, 32.5549), (0.549671854, 32.430771854), (0.6738, 32.1311))
            Line((0.6738, 32.1311), (0.6738, 17.8689))
            ThreePointArc((0.6738, 17.8689), (0.549671854, 17.569228146), (0.25, 17.4451))
            Line((0.25, 17.4451), (-1.25, 17.4451))
            ThreePointArc((-1.25, 17.4451), (-1.657434927, 17.276334927), (-1.8262, 16.8689))
            Line((-1.8262, 16.8689), (-1.8262, 3))
            ThreePointArc((-1.8262, 3), (-0.412638747, -0.412638747), (3, -1.8262))
            Line((3, -1.8262), (77, -1.8262))
            ThreePointArc((77, -1.8262), (80.412638747, -0.412638747), (81.8262, 3))
            Line((81.8262, 3), (81.8262, 47))
            ThreePointArc((81.8262, 47), (80.412638747, 50.412638747), (77, 51.8262))
            Line((77, 51.8262), (3, 51.8262))
            ThreePointArc((3, 51.8262), (-0.412638747, 50.412638747), (-1.8262, 47))
        make_face()
        with BuildLine():
            ThreePointArc((-1.25, 32.6311), (-1.603553391, 32.777546609), (-1.75, 33.1311))
            Line((-1.75, 33.1311), (-1.75, 47))
            ThreePointArc((-1.75, 47), (-0.358757211, 50.358757211), (3, 51.75))
            Line((3, 51.75), (77, 51.75))
            ThreePointArc((77, 51.75), (80.358757211, 50.358757211), (81.75, 47))
            Line((81.75, 47), (81.75, 3))
            ThreePointArc((81.75, 3), (80.358757211, -0.358757211), (77, -1.75))
            Line((77, -1.75), (3, -1.75))
            ThreePointArc((3, -1.75), (-0.358757211, -0.358757211), (-1.75, 3))
            Line((-1.75, 3), (-1.75, 16.8689))
            ThreePointArc((-1.75, 16.8689), (-1.603553391, 17.222453391), (-1.25, 17.3689))
            Line((-1.25, 17.3689), (0.25, 17.3689))
            ThreePointArc((0.25, 17.3689), (0.603553391, 17.515346609), (0.75, 17.8689))
            Line((0.75, 17.8689), (0.75, 32.1311))
            ThreePointArc((0.75, 32.1311), (0.603553391, 32.484653391), (0.25, 32.6311))
            Line((0.25, 32.6311), (-1.25, 32.6311))
        make_face(mode=Mode.SUBTRACT)
    # profile 2 of 6: a face of its own
    with BuildSketch(Plane(origin=(0, 0, 0), x_dir=(1, 0, 0), z_dir=(0, 1, 0)).offset(KERF_START_2)):
        with Locations((77, 47)):
            Circle(KERF_COMPENSATION_2_OUTLINE_R)
        with Locations((77, 47)):
            Circle(KERF_COMPENSATION_2_OUTLINE_R_2, mode=Mode.SUBTRACT)
    # profile 3 of 6: a face of its own
    with BuildSketch(Plane(origin=(0, 0, 0), x_dir=(1, 0, 0), z_dir=(0, 1, 0)).offset(KERF_START_2)):
        with Locations((3, 47)):
            Circle(KERF_COMPENSATION_2_OUTLINE_R)
        with Locations((3, 47)):
            Circle(KERF_COMPENSATION_2_OUTLINE_R_2, mode=Mode.SUBTRACT)
    # profile 4 of 6: a face of its own
    with BuildSketch(Plane(origin=(0, 0, 0), x_dir=(1, 0, 0), z_dir=(0, 1, 0)).offset(KERF_START_2)):
        with Locations((77, 3)):
            Circle(KERF_COMPENSATION_2_OUTLINE_R)
        with Locations((77, 3)):
            Circle(KERF_COMPENSATION_2_OUTLINE_R_2, mode=Mode.SUBTRACT)
    # profile 5 of 6: a face of its own
    with BuildSketch(Plane(origin=(0, 0, 0), x_dir=(1, 0, 0), z_dir=(0, 1, 0)).offset(KERF_START_2)):
        with Locations((3, 3)):
            Circle(KERF_COMPENSATION_2_OUTLINE_R)
        with Locations((3, 3)):
            Circle(KERF_COMPENSATION_2_OUTLINE_R_2, mode=Mode.SUBTRACT)
    # profile 6 of 6: a face of its own
    with BuildSketch(Plane(origin=(0, 0, 0), x_dir=(1, 0, 0), z_dir=(0, 1, 0)).offset(KERF_START_2)):
        with Locations((62.1, 32.1)):
            Circle(KERF_COMPENSATION_2_OUTLINE_R_3)
        with Locations((62.1, 32.1)):
            Circle(KERF_COMPENSATION_2_OUTLINE_R_4, mode=Mode.SUBTRACT)
    extrude(amount=KERF_COMPENSATION_2_DEPTH)


solid = Compound([body_3_1.part, body_2_1.part])
